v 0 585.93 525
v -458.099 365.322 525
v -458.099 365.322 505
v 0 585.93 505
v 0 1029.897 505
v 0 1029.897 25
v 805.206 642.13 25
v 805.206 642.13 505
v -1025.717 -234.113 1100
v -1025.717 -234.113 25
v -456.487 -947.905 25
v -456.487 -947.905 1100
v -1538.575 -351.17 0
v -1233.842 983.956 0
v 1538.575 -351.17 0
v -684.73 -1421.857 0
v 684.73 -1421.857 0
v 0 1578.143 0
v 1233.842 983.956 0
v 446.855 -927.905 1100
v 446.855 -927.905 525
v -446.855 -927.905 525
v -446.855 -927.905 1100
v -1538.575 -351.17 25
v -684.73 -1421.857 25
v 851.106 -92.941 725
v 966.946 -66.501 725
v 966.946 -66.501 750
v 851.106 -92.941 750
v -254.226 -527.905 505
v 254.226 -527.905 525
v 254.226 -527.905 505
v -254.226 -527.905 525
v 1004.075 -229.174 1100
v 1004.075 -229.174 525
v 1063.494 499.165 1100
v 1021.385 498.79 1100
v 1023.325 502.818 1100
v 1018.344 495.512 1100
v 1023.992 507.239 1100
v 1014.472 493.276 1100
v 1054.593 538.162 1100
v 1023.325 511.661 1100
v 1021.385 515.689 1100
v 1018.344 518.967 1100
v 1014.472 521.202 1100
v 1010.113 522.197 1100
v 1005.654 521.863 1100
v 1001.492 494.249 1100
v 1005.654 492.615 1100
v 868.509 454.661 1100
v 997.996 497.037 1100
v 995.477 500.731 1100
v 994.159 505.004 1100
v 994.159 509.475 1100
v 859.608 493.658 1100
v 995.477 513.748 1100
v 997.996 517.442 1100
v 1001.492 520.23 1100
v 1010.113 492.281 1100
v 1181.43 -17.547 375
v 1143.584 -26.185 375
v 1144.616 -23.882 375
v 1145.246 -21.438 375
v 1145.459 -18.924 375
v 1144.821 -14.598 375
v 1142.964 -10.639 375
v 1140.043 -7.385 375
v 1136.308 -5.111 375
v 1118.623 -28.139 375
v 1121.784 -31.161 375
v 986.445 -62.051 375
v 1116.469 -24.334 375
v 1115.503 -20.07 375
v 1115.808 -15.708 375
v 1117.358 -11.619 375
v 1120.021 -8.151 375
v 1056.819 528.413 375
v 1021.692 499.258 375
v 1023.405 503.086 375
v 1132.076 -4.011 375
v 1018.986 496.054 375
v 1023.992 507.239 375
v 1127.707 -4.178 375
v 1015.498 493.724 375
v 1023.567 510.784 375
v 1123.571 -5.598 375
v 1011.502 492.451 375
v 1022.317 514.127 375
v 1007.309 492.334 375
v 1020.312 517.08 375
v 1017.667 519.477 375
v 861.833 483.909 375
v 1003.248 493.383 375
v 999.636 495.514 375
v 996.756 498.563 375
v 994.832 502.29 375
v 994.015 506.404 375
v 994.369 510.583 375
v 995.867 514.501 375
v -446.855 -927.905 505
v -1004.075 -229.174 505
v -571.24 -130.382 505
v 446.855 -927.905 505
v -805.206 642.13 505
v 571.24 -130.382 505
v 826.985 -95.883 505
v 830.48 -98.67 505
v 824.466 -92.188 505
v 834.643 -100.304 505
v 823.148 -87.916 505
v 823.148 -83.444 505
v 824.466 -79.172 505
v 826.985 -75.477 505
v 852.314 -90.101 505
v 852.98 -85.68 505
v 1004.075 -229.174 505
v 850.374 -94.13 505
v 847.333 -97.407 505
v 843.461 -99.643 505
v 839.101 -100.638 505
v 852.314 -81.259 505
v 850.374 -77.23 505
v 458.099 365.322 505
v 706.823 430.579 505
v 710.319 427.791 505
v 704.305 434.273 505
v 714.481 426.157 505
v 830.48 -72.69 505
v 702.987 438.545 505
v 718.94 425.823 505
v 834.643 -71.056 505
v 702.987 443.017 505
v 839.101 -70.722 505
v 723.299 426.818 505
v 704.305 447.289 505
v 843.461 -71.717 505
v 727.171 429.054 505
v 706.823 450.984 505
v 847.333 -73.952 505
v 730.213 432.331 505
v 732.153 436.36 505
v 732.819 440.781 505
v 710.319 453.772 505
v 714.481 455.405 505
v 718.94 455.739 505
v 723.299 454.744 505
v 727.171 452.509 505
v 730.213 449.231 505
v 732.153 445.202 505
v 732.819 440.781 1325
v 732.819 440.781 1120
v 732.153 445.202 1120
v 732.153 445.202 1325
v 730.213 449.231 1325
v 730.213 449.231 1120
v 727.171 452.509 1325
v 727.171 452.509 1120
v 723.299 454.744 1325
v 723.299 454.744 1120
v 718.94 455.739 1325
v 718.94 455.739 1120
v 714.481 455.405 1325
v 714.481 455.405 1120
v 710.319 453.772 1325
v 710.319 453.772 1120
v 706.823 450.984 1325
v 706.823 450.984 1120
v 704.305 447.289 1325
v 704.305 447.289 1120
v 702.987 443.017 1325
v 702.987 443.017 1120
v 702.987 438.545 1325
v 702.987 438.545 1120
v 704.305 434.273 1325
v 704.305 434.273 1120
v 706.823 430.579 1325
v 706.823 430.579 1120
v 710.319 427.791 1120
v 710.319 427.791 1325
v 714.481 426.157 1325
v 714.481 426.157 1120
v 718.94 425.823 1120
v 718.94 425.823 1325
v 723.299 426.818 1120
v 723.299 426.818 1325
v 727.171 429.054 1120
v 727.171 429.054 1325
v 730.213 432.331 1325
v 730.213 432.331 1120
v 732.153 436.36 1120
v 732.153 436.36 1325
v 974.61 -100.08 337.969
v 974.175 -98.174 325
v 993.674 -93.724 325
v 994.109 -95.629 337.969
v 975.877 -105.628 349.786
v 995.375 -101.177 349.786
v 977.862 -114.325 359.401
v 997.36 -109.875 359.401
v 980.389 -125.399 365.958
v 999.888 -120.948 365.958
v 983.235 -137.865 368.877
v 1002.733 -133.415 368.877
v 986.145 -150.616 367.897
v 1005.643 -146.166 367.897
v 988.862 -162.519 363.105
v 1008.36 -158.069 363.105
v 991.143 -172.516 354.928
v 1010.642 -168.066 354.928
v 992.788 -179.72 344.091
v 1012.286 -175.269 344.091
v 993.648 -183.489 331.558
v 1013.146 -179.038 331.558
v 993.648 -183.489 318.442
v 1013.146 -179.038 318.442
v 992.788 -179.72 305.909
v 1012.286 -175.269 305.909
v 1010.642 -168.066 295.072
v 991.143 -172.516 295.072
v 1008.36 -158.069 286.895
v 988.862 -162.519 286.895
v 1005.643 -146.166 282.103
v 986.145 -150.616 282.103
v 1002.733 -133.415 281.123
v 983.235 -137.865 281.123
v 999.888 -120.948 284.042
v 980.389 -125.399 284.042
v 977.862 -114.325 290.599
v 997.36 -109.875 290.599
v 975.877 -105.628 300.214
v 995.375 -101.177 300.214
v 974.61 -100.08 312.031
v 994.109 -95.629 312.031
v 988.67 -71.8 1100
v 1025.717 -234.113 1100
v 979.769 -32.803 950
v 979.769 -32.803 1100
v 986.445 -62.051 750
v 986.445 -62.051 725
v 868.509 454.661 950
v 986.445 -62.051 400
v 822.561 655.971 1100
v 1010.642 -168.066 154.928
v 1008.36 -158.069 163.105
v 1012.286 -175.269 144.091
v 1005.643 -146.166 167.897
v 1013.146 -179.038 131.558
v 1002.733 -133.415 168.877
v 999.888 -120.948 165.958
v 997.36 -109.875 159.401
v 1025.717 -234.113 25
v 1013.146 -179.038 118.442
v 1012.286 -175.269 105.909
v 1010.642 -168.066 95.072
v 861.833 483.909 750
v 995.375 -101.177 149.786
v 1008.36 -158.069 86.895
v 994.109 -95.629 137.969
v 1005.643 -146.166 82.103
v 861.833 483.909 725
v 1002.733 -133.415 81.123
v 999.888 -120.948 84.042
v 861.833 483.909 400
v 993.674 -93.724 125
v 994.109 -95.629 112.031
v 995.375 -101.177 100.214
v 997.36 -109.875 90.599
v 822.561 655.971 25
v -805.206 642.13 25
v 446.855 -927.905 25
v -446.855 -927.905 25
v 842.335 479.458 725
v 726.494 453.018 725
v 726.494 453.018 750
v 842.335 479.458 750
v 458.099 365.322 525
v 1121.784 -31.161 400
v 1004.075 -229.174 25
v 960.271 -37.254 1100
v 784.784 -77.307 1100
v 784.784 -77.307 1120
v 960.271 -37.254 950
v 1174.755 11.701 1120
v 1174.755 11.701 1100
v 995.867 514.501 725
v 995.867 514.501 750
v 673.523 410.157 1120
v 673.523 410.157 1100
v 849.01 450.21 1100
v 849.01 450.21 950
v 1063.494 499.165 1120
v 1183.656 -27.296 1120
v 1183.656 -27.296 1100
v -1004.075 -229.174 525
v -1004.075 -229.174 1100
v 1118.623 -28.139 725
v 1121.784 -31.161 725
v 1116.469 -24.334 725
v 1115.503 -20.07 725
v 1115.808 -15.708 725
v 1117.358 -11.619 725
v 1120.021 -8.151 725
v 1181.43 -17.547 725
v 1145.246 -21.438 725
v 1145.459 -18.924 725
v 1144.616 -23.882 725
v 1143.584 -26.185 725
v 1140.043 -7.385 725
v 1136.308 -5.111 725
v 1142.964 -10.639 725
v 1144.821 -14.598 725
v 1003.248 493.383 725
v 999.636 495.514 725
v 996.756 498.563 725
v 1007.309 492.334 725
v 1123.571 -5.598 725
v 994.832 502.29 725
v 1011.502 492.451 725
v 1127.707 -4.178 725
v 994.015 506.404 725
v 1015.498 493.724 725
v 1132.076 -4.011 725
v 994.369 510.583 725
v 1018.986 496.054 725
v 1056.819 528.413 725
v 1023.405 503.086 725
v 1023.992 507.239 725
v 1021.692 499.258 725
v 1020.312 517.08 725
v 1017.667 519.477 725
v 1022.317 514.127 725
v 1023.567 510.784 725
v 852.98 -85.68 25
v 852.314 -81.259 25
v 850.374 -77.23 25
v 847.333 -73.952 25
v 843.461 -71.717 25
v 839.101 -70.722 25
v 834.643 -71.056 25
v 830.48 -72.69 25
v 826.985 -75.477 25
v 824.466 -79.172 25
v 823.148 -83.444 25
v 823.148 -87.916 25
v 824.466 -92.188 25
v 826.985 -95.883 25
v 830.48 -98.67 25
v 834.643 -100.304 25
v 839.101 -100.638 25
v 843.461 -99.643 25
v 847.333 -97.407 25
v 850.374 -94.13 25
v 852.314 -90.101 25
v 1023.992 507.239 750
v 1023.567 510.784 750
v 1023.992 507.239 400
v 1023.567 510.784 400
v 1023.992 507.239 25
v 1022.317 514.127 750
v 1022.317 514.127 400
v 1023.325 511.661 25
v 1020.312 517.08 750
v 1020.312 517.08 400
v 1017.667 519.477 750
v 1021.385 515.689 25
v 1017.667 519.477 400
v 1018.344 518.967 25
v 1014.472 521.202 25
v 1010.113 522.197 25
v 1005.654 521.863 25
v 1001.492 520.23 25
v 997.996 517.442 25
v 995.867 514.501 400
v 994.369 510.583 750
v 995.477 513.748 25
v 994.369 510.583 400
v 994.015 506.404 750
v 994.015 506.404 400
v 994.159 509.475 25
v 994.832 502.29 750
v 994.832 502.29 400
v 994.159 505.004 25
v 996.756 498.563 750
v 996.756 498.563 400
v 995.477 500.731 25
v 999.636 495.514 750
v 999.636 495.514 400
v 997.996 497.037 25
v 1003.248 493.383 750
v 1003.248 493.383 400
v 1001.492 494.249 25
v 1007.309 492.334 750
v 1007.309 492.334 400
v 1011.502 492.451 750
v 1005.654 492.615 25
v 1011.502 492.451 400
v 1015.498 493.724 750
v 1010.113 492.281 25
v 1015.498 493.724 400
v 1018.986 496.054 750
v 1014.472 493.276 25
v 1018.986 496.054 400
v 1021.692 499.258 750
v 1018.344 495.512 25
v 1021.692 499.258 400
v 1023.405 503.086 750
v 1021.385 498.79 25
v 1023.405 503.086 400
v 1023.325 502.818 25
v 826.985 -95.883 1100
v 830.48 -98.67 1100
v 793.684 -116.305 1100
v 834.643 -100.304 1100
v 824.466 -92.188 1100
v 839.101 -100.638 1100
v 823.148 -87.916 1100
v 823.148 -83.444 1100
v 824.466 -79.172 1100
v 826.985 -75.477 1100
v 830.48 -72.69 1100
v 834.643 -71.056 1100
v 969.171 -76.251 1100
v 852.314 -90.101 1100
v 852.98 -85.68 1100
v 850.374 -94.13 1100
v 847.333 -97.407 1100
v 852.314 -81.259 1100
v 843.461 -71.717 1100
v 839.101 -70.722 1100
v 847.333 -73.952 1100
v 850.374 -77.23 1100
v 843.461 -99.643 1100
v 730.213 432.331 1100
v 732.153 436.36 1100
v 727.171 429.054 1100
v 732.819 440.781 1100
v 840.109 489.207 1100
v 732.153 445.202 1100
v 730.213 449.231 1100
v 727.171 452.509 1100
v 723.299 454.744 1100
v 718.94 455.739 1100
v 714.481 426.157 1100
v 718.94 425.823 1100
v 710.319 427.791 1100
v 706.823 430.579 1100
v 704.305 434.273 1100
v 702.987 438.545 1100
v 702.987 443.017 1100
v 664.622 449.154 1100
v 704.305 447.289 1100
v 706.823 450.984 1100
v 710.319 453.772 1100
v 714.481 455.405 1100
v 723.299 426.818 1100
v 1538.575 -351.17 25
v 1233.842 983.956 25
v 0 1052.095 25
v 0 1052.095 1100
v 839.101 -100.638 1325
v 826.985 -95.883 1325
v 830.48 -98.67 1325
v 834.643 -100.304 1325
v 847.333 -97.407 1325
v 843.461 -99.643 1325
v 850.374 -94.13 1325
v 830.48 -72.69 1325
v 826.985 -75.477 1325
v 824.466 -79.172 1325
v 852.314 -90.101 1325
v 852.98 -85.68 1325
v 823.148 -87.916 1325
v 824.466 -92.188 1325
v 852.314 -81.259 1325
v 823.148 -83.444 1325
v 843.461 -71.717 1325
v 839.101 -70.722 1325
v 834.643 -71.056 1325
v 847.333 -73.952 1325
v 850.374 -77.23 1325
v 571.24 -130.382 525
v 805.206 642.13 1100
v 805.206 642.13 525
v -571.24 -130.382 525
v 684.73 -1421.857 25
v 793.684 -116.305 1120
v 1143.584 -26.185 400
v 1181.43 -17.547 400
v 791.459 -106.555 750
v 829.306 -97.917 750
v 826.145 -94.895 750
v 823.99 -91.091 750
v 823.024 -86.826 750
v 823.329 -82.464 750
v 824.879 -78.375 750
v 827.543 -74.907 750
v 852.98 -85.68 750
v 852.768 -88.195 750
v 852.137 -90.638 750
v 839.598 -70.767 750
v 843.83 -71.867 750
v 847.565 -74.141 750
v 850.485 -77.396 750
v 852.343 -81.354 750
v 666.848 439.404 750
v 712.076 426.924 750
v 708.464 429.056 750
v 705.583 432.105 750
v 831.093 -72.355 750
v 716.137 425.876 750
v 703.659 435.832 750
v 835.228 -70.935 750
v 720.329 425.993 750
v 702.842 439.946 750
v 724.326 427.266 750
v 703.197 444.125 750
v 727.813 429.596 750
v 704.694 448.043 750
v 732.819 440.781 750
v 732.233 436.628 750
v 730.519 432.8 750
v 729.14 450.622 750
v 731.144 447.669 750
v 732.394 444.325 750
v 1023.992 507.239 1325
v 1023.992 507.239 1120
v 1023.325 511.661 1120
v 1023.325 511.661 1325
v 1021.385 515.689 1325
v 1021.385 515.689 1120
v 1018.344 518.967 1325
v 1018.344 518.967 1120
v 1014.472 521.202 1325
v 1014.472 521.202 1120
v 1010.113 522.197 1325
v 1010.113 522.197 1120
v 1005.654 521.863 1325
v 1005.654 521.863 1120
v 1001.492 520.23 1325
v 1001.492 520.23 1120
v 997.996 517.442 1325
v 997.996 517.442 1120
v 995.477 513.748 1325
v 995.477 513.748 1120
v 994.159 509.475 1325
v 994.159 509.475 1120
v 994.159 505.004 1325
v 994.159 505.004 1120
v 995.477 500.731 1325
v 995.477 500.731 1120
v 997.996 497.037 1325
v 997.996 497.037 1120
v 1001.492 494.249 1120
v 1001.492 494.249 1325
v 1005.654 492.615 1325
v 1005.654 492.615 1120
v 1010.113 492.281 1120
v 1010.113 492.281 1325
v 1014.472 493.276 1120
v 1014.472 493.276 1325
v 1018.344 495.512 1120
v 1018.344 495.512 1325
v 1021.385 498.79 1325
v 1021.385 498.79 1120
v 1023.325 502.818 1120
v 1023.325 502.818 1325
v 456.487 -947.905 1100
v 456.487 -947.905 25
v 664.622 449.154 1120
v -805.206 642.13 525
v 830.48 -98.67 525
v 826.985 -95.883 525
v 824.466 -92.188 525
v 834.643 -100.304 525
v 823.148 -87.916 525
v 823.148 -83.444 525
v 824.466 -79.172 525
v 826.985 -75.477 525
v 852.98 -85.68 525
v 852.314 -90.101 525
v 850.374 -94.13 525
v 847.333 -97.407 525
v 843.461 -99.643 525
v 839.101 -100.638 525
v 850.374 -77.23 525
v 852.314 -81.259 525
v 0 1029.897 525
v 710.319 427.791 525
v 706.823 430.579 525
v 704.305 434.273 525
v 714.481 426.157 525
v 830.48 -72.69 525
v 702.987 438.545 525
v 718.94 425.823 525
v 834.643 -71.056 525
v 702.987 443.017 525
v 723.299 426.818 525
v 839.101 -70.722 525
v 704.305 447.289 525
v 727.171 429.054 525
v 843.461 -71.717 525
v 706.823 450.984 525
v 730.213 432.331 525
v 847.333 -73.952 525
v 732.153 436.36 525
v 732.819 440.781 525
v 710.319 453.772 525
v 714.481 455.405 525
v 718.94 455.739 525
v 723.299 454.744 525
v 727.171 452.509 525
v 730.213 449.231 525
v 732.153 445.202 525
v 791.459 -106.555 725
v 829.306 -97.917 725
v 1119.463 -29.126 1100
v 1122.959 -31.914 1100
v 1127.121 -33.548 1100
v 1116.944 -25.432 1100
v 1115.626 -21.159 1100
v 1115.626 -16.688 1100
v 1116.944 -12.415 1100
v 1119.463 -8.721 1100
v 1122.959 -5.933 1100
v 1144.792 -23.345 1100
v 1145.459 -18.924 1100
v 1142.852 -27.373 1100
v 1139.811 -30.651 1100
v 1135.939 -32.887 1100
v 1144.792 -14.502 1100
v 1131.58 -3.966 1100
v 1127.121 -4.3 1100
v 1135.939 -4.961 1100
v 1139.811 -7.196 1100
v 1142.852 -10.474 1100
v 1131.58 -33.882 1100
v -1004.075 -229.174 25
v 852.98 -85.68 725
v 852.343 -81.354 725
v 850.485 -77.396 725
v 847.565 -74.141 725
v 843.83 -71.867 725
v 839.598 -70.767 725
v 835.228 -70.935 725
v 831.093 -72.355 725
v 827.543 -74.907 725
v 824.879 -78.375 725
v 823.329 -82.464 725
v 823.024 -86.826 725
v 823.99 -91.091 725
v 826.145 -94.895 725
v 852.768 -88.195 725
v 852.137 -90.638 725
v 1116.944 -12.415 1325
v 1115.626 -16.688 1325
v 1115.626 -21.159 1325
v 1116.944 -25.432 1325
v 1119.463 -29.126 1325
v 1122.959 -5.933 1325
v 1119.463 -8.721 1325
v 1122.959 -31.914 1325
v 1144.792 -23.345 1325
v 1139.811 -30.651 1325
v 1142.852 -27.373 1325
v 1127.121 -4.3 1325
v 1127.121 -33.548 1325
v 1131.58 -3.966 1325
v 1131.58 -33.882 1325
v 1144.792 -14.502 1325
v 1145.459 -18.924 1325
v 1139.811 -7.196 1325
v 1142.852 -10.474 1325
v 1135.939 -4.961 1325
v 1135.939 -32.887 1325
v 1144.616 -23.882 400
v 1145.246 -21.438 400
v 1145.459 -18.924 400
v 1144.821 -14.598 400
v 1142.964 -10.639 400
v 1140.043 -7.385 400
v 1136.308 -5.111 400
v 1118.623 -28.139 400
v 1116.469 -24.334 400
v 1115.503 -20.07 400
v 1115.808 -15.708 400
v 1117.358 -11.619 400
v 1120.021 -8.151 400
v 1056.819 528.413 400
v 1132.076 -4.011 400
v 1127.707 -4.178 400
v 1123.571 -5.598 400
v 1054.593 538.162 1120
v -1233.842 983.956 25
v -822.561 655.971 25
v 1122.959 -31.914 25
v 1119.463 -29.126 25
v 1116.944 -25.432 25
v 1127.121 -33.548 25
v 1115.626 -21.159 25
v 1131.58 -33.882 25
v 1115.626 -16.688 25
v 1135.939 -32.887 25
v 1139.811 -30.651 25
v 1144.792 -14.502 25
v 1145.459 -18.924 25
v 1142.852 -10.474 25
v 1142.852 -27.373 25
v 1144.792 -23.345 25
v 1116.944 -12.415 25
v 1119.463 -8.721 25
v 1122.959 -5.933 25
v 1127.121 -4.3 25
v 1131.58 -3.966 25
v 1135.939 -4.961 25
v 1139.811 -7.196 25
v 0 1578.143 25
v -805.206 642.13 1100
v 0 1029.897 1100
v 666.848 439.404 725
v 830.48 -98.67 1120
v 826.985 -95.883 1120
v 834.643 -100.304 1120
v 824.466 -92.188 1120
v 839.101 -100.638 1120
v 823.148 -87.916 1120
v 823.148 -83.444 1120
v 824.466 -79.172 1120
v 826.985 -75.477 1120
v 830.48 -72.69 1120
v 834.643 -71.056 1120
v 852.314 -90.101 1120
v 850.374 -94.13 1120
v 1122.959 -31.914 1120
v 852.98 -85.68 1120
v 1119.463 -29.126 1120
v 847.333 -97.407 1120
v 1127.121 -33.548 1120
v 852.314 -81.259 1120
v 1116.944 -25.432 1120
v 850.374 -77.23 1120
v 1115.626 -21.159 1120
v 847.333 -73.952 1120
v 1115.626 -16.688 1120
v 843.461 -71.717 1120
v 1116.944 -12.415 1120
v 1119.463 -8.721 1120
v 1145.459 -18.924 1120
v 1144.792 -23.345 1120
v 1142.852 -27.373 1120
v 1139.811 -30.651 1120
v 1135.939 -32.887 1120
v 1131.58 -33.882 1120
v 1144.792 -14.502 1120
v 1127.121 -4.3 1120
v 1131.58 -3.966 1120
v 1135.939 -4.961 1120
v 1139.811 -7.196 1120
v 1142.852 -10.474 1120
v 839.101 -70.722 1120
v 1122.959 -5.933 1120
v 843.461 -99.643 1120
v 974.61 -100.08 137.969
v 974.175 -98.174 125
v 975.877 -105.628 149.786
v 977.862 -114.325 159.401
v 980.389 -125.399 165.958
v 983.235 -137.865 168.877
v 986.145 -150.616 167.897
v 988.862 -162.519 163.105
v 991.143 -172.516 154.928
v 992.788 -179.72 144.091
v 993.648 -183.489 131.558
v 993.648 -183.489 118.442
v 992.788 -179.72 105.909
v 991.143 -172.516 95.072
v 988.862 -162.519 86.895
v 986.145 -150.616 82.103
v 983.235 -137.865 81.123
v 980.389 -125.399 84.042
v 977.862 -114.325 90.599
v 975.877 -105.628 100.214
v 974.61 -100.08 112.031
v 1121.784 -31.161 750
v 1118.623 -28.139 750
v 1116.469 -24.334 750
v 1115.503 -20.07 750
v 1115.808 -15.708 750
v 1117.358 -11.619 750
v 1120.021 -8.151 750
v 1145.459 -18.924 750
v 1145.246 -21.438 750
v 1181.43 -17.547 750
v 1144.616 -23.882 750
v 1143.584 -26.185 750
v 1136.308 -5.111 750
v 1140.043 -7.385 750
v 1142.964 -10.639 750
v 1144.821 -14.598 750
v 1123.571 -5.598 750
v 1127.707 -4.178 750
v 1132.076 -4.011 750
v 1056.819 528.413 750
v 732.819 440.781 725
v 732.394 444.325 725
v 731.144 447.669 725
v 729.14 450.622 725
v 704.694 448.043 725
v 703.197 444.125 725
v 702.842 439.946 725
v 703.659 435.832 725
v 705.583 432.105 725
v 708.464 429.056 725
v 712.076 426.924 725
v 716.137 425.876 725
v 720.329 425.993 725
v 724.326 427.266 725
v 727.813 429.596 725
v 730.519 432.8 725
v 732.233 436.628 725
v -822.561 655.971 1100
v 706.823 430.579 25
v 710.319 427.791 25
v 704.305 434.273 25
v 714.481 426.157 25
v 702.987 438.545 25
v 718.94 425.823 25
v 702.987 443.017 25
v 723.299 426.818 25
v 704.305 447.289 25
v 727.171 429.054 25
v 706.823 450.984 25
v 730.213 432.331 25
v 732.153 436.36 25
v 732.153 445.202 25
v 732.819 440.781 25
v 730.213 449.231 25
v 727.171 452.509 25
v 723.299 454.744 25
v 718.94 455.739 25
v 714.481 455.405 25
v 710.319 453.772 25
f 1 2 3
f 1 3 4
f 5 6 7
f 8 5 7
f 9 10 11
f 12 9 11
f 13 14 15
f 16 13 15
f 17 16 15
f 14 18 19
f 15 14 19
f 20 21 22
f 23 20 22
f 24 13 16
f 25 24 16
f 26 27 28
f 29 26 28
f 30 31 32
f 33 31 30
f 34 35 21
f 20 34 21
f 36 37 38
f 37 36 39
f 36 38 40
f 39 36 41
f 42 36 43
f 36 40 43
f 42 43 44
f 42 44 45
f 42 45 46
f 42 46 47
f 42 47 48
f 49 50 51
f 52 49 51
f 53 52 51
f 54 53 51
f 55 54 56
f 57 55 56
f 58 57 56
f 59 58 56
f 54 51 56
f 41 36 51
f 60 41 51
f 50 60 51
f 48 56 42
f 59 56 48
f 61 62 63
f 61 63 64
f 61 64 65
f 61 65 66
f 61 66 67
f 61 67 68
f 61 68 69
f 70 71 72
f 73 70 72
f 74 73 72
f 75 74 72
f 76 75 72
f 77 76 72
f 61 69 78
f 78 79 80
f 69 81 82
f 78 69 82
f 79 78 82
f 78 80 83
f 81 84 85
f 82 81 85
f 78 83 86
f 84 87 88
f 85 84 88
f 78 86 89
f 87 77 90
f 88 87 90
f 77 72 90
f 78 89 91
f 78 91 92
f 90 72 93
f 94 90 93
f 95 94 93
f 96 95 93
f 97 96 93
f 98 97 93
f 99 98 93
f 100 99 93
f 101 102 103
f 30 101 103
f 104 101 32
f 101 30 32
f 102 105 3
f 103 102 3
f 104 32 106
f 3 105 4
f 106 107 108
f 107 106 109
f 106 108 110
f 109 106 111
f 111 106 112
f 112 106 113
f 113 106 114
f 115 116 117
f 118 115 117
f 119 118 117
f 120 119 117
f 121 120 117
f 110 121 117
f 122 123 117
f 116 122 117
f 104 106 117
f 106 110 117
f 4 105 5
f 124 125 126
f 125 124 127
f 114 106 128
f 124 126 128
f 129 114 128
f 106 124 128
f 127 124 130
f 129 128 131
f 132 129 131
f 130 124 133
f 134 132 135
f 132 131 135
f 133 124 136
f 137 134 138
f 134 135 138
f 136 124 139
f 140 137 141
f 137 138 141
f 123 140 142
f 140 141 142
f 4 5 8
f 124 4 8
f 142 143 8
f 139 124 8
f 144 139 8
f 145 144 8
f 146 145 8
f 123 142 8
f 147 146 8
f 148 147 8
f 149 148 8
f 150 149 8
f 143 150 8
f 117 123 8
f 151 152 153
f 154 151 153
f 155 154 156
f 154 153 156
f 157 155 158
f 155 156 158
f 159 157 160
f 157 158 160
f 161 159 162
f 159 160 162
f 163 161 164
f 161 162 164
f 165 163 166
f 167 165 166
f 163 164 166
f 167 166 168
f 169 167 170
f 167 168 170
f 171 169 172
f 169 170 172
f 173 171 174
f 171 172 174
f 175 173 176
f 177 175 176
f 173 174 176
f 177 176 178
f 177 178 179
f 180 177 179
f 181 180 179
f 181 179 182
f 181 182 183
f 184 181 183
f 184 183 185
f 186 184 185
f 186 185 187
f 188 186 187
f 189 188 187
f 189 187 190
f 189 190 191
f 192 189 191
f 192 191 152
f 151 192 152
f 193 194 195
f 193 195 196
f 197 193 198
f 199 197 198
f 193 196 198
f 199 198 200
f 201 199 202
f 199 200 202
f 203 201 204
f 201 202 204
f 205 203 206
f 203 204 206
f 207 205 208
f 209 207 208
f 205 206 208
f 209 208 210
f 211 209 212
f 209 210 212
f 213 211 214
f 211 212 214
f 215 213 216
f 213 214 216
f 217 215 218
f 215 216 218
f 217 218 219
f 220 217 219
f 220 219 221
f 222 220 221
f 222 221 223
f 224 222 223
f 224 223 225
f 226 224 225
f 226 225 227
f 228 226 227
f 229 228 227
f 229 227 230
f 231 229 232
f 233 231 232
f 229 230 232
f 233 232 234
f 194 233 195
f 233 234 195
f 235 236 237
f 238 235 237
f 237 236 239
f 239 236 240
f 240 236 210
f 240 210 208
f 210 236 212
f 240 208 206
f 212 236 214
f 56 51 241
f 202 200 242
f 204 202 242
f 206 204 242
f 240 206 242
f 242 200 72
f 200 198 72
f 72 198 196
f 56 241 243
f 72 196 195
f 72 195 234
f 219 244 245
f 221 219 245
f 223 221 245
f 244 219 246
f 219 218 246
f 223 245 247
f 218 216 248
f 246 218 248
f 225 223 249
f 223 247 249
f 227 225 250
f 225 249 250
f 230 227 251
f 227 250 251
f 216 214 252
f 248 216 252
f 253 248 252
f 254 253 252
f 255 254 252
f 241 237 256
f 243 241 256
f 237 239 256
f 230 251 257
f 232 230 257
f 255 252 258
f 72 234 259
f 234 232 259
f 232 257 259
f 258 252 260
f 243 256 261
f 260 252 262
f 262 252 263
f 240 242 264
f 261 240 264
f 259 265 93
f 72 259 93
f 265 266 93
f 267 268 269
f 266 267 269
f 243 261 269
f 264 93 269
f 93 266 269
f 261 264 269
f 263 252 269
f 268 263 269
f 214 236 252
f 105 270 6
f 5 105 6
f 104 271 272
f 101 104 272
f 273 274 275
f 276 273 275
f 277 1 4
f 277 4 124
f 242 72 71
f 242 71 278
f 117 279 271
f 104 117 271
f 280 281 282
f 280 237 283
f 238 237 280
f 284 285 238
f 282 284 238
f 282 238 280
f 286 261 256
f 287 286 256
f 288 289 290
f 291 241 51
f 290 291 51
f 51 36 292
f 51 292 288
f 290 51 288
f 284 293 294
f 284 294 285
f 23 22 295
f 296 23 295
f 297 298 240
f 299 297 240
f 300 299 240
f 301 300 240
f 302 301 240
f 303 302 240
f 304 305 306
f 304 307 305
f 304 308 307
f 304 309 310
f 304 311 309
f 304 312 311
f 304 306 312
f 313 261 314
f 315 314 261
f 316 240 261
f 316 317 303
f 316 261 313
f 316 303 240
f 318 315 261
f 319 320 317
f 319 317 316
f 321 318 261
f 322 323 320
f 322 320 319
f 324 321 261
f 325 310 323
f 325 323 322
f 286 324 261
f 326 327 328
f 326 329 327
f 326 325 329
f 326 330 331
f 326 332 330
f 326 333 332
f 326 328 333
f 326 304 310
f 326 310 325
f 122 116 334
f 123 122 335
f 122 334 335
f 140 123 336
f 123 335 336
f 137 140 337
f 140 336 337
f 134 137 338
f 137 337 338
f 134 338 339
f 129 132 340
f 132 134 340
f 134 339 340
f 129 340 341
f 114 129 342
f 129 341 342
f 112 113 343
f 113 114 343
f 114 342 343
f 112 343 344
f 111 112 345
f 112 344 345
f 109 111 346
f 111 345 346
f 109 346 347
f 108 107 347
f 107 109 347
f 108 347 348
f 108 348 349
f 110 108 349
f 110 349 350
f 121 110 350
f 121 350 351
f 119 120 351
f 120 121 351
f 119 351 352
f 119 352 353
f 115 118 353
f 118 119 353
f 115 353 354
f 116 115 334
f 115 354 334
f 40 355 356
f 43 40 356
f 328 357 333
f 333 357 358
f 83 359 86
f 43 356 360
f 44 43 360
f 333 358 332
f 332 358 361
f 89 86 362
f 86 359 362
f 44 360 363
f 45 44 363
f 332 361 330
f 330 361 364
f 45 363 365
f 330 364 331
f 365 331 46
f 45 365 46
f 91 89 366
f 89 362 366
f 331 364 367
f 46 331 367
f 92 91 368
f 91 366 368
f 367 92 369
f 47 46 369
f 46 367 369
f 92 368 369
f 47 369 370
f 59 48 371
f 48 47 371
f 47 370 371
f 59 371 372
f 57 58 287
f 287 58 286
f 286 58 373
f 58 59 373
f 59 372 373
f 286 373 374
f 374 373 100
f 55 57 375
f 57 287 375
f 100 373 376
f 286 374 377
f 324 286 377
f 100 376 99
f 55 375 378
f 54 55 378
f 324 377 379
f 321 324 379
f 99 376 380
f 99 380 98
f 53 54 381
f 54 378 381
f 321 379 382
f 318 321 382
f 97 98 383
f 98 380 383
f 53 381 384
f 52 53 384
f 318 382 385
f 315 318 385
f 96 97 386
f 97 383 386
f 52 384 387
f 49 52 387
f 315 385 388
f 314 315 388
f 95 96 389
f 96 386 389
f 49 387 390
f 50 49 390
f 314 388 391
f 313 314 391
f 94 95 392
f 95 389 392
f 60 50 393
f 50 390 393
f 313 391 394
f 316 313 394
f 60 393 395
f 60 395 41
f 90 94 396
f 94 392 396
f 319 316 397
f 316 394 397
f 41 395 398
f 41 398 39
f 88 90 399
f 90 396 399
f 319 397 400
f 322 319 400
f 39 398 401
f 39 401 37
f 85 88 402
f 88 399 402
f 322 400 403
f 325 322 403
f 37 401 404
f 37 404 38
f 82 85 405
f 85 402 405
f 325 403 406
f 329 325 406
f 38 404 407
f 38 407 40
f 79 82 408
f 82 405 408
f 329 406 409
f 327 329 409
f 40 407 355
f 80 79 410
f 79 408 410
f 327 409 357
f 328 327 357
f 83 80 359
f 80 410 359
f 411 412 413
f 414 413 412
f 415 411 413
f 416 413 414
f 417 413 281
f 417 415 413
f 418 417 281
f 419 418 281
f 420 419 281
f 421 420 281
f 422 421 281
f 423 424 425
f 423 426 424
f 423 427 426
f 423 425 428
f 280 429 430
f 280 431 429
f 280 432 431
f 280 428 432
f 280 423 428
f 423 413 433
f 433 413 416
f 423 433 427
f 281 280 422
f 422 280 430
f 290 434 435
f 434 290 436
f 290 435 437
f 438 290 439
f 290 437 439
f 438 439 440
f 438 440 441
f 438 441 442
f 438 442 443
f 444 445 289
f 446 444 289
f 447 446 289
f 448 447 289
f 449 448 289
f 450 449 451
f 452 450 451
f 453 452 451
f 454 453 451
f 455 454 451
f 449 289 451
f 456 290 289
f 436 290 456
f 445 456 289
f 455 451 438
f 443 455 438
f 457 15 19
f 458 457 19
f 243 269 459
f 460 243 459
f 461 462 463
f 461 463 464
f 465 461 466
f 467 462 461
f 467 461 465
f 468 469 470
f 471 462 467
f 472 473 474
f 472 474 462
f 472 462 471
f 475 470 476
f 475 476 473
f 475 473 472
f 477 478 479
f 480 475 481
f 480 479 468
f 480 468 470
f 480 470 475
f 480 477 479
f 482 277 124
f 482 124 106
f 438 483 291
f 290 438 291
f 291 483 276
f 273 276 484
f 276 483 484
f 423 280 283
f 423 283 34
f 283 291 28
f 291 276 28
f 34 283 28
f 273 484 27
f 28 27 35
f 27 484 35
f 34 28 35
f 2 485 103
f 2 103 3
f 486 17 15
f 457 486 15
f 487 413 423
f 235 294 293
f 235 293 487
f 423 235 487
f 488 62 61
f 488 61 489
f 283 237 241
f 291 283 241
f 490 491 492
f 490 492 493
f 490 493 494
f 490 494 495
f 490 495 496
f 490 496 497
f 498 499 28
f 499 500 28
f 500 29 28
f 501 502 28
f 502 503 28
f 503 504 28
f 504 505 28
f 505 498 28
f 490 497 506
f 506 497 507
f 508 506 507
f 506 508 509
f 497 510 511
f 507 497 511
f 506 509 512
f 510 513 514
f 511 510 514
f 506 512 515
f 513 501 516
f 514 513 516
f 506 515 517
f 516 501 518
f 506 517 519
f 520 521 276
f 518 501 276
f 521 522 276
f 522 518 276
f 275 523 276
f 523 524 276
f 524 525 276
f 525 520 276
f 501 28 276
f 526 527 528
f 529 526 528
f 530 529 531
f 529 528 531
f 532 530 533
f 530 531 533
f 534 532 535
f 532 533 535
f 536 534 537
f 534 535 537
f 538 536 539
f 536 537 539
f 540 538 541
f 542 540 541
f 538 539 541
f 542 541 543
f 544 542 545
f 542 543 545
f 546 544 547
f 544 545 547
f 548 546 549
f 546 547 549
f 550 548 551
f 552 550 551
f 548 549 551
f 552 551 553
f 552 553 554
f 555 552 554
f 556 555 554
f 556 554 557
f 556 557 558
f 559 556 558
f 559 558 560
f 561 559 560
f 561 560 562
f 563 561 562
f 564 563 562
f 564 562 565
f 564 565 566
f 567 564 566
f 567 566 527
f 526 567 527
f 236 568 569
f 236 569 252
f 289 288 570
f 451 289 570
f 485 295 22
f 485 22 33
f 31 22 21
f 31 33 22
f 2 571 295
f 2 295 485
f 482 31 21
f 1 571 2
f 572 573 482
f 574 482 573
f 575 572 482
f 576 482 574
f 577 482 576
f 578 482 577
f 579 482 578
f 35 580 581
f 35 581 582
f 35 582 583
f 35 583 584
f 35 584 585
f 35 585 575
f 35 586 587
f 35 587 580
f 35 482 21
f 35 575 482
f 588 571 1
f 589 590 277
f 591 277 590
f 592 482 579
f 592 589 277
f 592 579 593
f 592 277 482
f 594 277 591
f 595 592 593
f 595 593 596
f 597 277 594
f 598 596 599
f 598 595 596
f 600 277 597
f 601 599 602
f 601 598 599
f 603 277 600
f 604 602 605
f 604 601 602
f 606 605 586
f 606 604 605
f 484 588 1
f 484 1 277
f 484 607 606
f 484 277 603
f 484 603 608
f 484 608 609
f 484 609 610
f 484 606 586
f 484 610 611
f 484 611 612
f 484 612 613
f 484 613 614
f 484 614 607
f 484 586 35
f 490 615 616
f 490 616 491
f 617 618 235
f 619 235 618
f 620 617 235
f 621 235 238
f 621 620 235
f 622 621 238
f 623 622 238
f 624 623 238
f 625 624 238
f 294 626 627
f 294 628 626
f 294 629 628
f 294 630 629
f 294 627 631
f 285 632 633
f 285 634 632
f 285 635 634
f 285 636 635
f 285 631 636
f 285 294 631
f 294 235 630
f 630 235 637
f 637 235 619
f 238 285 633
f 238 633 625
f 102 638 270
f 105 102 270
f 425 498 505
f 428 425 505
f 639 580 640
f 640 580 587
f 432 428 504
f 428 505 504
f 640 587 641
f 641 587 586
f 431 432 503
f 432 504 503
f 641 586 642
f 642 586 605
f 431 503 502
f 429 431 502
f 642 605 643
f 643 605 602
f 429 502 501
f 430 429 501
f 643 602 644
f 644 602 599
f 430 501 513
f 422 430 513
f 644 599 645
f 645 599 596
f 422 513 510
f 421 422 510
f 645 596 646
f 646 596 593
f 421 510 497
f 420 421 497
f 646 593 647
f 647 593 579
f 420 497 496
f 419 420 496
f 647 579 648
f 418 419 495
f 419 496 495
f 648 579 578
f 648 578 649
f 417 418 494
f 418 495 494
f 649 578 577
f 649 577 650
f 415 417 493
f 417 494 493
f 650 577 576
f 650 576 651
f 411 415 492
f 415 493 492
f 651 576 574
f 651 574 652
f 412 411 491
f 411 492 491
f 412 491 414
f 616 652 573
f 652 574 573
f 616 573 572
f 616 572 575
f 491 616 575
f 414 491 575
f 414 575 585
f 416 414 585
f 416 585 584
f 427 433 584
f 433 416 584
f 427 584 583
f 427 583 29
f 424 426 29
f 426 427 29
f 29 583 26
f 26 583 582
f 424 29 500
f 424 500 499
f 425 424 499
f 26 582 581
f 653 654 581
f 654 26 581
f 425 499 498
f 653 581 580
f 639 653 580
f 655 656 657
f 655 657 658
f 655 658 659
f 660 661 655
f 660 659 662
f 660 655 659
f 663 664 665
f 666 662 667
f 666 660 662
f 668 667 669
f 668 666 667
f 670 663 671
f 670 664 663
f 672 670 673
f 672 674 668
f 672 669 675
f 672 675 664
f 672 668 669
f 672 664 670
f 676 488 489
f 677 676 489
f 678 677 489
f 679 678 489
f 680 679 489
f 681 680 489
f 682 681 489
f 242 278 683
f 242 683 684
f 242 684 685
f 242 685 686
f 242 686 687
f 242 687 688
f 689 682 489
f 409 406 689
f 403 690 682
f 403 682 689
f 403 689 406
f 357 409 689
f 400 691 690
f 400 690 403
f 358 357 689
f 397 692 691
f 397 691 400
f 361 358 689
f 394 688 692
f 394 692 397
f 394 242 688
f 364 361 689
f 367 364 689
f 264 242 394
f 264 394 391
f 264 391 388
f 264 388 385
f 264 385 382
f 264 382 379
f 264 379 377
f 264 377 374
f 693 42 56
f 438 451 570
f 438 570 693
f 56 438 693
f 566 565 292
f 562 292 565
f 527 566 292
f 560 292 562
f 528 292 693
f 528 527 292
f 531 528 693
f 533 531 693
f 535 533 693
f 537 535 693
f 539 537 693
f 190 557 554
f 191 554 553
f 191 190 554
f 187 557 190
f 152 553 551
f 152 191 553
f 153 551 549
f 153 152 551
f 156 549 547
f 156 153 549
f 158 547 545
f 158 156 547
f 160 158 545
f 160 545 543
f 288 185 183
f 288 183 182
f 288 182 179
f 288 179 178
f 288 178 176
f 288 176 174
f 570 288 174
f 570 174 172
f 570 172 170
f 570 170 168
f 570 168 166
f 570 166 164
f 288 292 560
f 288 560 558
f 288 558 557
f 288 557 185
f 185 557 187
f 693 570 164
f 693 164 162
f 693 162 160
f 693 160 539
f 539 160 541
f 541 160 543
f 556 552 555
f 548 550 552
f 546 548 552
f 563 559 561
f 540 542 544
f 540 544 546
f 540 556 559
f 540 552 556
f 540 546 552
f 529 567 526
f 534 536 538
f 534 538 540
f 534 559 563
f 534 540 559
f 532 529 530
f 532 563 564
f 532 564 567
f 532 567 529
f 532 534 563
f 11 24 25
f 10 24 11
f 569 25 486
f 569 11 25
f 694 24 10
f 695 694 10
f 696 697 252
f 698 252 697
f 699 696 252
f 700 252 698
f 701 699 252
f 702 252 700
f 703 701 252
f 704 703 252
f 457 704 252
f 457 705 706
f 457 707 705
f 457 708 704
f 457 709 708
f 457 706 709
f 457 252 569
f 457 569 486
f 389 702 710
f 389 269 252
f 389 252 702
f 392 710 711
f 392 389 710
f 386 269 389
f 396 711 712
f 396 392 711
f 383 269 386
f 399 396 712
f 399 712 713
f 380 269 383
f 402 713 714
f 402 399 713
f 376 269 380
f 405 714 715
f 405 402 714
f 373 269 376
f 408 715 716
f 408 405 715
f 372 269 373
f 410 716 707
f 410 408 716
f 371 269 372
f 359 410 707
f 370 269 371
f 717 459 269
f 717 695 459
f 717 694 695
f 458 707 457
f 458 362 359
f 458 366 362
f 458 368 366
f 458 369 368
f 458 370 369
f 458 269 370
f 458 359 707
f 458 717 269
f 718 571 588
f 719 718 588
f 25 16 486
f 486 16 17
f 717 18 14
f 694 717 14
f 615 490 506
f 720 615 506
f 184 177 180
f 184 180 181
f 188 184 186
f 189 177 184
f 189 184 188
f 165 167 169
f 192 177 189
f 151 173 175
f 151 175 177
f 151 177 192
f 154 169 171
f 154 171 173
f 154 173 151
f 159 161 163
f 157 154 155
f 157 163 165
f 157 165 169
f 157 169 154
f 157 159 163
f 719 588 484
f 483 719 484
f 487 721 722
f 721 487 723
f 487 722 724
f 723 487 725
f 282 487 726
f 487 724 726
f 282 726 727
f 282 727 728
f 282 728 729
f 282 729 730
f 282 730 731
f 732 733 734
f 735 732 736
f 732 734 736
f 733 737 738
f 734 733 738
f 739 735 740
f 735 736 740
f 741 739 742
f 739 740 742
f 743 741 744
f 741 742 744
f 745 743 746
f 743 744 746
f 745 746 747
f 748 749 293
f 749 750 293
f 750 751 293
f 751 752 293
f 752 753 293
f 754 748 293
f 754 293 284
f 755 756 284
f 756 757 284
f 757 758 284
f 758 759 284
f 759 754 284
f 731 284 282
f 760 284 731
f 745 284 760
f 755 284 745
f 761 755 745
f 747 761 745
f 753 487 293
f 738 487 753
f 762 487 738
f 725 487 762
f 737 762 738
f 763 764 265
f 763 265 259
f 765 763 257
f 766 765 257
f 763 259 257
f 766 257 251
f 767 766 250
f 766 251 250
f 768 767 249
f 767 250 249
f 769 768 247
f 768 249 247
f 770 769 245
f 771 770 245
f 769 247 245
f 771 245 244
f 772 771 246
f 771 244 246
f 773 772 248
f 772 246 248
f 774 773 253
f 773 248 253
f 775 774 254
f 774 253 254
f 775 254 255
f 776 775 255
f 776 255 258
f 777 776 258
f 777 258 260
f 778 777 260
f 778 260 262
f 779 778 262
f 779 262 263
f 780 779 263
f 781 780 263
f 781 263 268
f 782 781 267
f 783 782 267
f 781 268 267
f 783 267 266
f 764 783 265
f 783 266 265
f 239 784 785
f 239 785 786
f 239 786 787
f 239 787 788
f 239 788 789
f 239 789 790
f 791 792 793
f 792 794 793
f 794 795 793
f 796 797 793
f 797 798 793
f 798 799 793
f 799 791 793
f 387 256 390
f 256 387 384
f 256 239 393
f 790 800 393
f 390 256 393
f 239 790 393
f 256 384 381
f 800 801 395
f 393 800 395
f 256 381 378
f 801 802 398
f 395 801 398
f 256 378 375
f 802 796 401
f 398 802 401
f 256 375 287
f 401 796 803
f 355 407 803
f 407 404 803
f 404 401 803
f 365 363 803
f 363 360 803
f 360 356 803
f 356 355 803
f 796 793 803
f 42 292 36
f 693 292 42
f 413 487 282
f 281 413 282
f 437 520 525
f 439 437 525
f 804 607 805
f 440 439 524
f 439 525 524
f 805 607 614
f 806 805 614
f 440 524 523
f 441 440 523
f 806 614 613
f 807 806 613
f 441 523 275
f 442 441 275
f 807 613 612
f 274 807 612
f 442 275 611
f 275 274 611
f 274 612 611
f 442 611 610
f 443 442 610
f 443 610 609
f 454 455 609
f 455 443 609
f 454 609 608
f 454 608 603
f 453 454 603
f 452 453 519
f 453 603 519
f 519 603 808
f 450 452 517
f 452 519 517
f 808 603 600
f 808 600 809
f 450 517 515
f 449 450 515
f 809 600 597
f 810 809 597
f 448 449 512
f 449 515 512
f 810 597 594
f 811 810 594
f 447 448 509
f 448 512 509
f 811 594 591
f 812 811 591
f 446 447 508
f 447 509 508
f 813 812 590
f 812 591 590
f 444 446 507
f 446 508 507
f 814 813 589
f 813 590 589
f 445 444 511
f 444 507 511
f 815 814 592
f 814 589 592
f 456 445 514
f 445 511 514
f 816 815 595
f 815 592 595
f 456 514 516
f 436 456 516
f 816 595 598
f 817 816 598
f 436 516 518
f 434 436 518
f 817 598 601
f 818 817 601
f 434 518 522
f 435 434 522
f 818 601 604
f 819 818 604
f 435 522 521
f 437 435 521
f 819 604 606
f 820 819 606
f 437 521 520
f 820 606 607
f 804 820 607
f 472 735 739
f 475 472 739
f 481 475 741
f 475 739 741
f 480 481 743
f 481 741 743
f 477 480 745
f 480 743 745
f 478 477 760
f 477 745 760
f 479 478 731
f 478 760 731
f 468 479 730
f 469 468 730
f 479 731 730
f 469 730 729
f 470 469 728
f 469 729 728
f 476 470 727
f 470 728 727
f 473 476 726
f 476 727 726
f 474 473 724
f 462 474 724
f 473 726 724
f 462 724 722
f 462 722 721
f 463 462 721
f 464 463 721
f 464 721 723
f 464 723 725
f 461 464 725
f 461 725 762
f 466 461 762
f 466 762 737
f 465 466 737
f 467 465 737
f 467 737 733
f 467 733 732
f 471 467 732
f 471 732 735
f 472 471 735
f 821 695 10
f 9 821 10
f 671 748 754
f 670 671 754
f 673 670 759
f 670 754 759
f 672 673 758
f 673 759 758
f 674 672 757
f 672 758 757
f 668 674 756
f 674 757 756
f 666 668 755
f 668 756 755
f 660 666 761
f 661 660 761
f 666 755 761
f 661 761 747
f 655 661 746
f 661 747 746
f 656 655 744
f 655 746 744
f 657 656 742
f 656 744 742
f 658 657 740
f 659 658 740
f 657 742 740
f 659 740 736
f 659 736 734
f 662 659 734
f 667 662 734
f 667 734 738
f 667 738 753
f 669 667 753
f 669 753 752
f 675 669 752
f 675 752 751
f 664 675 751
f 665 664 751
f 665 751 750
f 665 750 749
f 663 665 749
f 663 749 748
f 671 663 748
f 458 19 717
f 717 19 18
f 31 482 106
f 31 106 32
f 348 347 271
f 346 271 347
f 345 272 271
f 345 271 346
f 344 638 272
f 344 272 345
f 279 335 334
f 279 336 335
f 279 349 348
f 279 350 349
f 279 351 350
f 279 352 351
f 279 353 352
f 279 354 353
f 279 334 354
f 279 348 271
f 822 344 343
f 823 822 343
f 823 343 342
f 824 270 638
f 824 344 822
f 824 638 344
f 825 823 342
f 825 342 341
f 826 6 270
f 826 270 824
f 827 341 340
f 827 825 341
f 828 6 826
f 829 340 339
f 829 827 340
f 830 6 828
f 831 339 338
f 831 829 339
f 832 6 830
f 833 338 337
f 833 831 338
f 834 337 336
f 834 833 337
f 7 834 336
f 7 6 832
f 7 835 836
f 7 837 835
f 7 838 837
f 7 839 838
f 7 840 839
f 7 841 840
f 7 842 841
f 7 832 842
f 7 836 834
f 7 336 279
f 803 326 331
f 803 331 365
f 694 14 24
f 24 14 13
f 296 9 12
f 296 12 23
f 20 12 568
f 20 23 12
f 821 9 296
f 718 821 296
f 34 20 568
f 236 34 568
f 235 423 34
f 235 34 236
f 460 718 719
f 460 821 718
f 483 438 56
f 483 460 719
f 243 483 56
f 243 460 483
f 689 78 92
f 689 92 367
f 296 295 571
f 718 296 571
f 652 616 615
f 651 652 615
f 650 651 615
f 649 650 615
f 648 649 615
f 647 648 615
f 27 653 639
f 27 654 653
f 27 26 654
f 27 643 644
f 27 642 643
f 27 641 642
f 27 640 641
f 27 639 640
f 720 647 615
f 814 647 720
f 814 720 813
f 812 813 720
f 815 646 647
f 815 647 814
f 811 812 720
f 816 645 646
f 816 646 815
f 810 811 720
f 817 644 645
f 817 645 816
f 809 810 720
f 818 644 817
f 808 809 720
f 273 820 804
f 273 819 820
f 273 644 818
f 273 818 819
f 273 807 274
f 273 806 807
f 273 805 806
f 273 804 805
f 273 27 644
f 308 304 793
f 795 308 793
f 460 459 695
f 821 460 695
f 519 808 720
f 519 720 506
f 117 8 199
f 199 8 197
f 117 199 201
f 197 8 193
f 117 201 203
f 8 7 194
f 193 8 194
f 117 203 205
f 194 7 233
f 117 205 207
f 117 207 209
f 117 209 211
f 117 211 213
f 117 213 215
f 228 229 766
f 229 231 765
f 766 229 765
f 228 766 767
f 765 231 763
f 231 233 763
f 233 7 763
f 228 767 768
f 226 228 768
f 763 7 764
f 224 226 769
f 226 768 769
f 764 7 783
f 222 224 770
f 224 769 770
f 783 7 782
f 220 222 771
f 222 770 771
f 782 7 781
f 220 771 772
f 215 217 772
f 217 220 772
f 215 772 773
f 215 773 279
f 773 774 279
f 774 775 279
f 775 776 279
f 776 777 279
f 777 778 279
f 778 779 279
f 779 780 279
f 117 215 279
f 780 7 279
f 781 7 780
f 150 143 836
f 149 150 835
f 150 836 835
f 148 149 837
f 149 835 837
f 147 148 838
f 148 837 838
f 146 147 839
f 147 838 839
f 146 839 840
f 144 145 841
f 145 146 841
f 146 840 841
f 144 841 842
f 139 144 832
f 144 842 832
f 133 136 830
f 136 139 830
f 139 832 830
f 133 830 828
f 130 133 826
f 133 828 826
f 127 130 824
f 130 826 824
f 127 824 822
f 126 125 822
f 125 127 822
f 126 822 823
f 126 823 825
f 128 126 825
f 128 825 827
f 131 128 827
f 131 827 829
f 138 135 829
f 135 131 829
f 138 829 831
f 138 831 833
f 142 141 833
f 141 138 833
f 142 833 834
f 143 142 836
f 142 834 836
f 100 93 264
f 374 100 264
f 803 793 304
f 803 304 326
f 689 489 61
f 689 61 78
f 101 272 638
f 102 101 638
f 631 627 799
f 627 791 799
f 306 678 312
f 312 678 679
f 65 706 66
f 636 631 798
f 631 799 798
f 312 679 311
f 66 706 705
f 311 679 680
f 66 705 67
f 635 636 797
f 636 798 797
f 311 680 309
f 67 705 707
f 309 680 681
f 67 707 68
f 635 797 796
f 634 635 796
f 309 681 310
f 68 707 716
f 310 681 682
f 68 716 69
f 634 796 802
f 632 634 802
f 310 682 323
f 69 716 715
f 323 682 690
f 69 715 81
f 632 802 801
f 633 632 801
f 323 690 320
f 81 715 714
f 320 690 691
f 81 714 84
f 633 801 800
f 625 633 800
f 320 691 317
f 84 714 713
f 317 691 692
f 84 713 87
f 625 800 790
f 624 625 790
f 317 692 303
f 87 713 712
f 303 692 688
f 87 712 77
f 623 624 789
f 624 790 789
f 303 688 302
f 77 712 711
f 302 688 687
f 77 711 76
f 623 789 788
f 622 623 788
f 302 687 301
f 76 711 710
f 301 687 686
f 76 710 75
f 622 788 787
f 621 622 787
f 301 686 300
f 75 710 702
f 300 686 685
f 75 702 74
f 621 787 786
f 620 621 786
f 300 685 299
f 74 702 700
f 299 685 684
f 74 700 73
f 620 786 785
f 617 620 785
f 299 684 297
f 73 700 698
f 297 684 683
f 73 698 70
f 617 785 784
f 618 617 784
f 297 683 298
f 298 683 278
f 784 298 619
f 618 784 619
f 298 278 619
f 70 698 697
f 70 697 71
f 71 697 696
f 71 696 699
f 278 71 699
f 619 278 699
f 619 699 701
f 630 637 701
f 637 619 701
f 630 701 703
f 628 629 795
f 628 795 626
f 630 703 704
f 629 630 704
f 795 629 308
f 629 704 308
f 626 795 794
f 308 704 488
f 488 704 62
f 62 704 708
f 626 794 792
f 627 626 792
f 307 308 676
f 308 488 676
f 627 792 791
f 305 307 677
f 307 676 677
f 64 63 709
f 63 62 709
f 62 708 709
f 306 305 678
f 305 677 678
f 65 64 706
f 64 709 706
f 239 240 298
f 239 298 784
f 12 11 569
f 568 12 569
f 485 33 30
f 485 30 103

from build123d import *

# Parameters (mm, degrees)
F1_DEPTH  = 1100
F3_DEPTH  = 25
F6_DEPTH  = 20
F7_W      = 500
F7_H      = 150
F8_DEPTH  = 20
F7_R      = 44
F9_DEPTH  = 20
F10_R     = 15
F11_DEPTH = 1300
F7_W_2    = 560
F7_H_2    = 25
F12_DEPTH = 200
F13_DEPTH = 200
F7_W_3    = 40
F7_H_3    = 20
F14_DEPTH = 200


with BuildPart() as f1:
    # F0 (on Top) → F1 (new body)
    with BuildSketch(Plane.XY):
        Polygon((822.5610589096, 655.9705552114), (0, 1052.0950836017), (-822.5610589096, 655.9705552114), (-1025.7168632726, -234.1131806139), (-456.4869487803, -947.9049163983), (456.4869487803, -947.9049163983), (1025.7168632726, -234.1131806139), align=None)
        Polygon((805.2057093449, 642.1301257788), (1004.07509635, -229.1735885395), (446.8554564041, -927.9049163983), (-446.8554564041, -927.9049163983), (-1004.07509635, -229.1735885395), (-805.2057093449, 642.1301257788), (0, 1029.8967583182), align=None, mode=Mode.SUBTRACT)
    extrude(amount=F1_DEPTH)

    # F2 (on Top) → F3 (join)
    with BuildSketch(Plane.XY):
        Polygon((1233.8415883644, 983.955832817), (0, 1578.1426254025), (-1233.8415883644, 983.955832817), (-1538.5752949088, -351.1697709208), (-684.7304231704, -1421.8573745975), (684.7304231704, -1421.8573745975), (1538.5752949088, -351.1697709208), align=None)
    extrude(amount=F3_DEPTH)

    # F5 (on offset) → F6 (join)
    with BuildSketch(Plane.XY.offset(525)):
        Polygon((0, 1029.8967583182), (-805.2057093449, 642.1301257788), (-1004.07509635, -229.1735885395), (-446.8554564041, -927.9049163983), (446.8554564041, -927.9049163983), (1004.07509635, -229.1735885395), (805.2057093449, 642.1301257788), align=None)
        Polygon((-458.0987180509, 365.3215371267), (0, 585.9302526483), (458.0987180509, 365.3215371267), (571.2397578986, -130.3817470526), (254.2256088811, -527.9049163983), (-254.2256088811, -527.9049163983), (-571.2397578986, -130.3817470526), align=None, mode=Mode.SUBTRACT)
    extrude(amount=-F6_DEPTH)

    # F7 (on face) → F8 (cut)
    with BuildSketch(Plane(origin=(924.1389610911, 210.9286872987, 0), x_dir=(-0.222520934, 0.9749279122, 0), z_dir=(0.9749279122, 0.222520934, 0))):
        with Locations((5.12197e-05, 1025)):
            Rectangle(F7_W, F7_H)
    extrude(amount=-F8_DEPTH, mode=Mode.SUBTRACT)

    # F7 (on face) → F9 (cut)
    with BuildSketch(Plane(origin=(924.1389610911, 210.9286872987, 0), x_dir=(-0.222520934, 0.9749279122, 0), z_dir=(0.9749279122, 0.222520934, 0))):
        with Locations((-356.4869487803, 325)):
            Circle(F7_R)
        with Locations((-356.4869487803, 125)):
            Circle(F7_R)
    extrude(amount=-F9_DEPTH, mode=Mode.SUBTRACT)

    # F10 (on face) → F11 (join)
    with BuildSketch(Plane.XY.offset(25)):
        with Locations((1130.4587886891, -18.9236589614)):
            Circle(F10_R)
        with Locations((1008.9917511872, 507.2393885425)):
            Circle(F10_R)
        with Locations((717.8191106982, 440.7811334299)):
            Circle(F10_R)
        with Locations((837.9804150346, -85.6799391483)):
            Circle(F10_R)
    extrude(amount=F11_DEPTH)

    # F7 (on face) → F12 (join)
    with BuildSketch(Plane(origin=(924.1389610911, 210.9286872987, 0), x_dir=(-0.222520934, 0.9749279122, 0), z_dir=(0.9749279122, 0.222520934, 0))):
        with Locations((5.12197e-05, 387.5)):
            Rectangle(F7_W_2, F7_H_2)
    extrude(amount=F12_DEPTH)

    # F7 (on face) → F13 (join, symmetric)
    with BuildSketch(Plane(origin=(924.1389610911, 210.9286872987, 0), x_dir=(-0.222520934, 0.9749279122, 0), z_dir=(0.9749279122, 0.222520934, 0))):
        with Locations((5.12197e-05, 737.5)):
            Rectangle(F7_W_2, F7_H_2)
    extrude(amount=F13_DEPTH, both=True)

    # F7 (on face) → F14 (join, symmetric)
    with BuildSketch(Plane(origin=(924.1389610911, 210.9286872987, 0), x_dir=(-0.222520934, 0.9749279122, 0), z_dir=(0.9749279122, 0.222520934, 0))):
        with Locations((270.0000512197, 1110)):
            Rectangle(F7_W_3, F7_H_3)
        with Locations((-269.9999487803, 1110)):
            Rectangle(F7_W_3, F7_H_3)
    extrude(amount=F14_DEPTH, both=True)


solid = f1.part
